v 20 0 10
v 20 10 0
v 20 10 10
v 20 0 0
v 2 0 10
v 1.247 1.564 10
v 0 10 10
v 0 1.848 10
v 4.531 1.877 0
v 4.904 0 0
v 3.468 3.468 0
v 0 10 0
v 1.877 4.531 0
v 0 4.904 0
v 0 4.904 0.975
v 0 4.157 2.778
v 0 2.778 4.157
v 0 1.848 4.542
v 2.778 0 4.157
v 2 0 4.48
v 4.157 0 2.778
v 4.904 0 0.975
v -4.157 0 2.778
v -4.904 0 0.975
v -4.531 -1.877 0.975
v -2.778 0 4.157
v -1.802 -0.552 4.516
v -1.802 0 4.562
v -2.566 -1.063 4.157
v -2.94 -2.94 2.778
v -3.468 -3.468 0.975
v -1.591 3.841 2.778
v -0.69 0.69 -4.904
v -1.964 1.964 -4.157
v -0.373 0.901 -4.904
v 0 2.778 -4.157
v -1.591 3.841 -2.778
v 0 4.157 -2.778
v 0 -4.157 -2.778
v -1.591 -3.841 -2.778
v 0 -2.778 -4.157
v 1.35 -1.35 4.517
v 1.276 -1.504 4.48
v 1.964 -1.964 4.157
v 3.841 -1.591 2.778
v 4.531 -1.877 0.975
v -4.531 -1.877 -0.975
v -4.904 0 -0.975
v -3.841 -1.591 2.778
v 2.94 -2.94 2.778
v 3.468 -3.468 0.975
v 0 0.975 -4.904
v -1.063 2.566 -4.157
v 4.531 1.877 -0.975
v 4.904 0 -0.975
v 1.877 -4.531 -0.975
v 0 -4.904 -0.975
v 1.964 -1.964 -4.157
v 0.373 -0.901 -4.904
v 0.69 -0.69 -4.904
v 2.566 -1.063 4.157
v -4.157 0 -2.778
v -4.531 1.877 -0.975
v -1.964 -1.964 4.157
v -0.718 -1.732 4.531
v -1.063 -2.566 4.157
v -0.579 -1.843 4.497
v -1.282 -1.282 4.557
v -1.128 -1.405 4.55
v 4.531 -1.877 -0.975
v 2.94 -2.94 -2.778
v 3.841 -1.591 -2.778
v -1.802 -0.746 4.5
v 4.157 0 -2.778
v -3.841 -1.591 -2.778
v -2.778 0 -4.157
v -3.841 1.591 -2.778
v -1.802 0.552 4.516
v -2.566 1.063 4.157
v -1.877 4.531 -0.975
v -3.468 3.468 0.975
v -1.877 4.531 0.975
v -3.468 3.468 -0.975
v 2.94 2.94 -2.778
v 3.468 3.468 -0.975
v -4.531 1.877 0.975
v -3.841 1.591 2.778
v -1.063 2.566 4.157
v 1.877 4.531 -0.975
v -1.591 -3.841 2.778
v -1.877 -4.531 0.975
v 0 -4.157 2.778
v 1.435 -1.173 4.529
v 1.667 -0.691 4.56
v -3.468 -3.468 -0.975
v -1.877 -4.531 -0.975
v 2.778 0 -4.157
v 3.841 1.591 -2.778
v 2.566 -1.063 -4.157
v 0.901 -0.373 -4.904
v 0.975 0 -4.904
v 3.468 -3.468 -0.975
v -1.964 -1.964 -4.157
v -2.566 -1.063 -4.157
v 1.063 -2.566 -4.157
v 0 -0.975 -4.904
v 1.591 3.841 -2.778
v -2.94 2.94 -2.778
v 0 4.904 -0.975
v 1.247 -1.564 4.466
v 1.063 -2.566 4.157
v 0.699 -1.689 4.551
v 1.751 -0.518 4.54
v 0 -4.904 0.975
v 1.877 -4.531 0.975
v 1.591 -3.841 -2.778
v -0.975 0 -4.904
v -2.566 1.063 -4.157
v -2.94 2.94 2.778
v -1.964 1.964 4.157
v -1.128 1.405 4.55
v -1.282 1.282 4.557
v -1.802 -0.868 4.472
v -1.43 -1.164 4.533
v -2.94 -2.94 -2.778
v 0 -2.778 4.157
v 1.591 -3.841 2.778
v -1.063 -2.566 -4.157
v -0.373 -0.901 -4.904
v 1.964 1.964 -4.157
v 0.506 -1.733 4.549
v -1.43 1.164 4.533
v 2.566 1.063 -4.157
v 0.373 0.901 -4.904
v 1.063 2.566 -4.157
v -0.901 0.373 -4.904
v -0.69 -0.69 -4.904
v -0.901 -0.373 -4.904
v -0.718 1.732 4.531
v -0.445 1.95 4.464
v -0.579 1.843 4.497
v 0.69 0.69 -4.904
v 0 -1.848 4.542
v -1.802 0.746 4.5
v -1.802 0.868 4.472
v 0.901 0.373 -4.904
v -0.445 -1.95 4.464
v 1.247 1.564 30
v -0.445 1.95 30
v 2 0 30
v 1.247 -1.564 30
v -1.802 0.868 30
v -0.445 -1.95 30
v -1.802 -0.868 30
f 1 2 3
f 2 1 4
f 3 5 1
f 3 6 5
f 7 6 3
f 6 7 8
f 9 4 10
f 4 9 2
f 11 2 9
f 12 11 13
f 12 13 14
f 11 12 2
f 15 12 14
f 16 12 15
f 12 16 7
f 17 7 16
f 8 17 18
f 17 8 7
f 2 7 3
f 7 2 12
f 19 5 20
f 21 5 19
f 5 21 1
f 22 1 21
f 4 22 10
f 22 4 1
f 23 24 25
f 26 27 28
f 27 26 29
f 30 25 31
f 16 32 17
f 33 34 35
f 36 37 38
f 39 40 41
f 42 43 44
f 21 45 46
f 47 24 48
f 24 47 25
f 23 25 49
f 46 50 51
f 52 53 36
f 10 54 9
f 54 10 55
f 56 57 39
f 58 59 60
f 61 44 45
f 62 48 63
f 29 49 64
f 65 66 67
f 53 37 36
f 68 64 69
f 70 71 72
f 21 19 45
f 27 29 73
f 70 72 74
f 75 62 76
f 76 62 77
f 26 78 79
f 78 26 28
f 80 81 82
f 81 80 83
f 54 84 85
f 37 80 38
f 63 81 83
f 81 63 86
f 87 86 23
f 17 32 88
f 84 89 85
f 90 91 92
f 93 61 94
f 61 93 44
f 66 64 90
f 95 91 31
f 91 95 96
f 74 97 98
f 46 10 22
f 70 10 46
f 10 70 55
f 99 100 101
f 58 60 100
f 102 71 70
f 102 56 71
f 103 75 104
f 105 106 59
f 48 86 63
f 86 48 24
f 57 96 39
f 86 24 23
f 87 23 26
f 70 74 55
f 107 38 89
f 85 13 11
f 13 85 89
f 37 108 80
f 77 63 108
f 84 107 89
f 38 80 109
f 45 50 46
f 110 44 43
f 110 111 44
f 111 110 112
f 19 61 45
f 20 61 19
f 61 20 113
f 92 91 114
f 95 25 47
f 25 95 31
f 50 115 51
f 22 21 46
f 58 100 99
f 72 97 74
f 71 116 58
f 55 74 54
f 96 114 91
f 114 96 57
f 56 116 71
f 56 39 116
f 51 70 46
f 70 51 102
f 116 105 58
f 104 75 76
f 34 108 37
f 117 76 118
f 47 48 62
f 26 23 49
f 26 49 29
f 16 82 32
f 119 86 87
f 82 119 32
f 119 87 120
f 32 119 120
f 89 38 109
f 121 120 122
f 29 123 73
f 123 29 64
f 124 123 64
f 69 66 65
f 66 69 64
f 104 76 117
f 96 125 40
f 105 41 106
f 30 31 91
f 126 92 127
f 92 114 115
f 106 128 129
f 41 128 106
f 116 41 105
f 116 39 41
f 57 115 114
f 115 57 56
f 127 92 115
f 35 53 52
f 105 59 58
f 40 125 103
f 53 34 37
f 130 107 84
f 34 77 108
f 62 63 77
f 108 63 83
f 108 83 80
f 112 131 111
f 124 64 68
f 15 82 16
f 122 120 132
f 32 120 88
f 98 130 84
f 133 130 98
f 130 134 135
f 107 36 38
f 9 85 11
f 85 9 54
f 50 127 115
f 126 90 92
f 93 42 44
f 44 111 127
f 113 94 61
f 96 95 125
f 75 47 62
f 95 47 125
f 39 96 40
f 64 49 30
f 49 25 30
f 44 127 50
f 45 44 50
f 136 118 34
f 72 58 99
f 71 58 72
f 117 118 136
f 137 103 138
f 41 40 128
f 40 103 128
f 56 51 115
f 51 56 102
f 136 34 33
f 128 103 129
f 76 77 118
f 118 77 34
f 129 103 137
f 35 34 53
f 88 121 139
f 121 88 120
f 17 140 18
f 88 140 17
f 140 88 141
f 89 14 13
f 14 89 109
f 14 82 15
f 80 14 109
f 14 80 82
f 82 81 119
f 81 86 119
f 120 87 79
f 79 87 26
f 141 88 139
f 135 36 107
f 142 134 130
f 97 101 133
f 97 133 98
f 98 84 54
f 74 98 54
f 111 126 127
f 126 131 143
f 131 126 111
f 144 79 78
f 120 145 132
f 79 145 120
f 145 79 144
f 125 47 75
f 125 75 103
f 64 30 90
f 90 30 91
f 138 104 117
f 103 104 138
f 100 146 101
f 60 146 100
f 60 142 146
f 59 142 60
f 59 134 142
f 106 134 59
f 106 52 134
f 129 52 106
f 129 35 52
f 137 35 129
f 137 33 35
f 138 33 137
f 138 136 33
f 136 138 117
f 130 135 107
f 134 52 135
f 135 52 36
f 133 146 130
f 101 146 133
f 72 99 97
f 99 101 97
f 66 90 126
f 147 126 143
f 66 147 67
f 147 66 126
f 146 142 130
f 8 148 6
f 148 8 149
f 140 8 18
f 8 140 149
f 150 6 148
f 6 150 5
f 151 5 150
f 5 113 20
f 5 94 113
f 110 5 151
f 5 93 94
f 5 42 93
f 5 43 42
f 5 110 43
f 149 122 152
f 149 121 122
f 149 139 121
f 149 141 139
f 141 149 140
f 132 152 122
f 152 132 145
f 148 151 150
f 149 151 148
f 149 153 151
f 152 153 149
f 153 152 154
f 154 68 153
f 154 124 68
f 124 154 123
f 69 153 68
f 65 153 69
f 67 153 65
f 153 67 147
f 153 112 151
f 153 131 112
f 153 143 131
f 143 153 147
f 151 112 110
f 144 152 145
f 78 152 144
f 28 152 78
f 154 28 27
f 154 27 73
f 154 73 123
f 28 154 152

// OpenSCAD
cube([20, 10, 10]); 
sphere(5); 
cylinder(h=30, r1=2, r2=2);
